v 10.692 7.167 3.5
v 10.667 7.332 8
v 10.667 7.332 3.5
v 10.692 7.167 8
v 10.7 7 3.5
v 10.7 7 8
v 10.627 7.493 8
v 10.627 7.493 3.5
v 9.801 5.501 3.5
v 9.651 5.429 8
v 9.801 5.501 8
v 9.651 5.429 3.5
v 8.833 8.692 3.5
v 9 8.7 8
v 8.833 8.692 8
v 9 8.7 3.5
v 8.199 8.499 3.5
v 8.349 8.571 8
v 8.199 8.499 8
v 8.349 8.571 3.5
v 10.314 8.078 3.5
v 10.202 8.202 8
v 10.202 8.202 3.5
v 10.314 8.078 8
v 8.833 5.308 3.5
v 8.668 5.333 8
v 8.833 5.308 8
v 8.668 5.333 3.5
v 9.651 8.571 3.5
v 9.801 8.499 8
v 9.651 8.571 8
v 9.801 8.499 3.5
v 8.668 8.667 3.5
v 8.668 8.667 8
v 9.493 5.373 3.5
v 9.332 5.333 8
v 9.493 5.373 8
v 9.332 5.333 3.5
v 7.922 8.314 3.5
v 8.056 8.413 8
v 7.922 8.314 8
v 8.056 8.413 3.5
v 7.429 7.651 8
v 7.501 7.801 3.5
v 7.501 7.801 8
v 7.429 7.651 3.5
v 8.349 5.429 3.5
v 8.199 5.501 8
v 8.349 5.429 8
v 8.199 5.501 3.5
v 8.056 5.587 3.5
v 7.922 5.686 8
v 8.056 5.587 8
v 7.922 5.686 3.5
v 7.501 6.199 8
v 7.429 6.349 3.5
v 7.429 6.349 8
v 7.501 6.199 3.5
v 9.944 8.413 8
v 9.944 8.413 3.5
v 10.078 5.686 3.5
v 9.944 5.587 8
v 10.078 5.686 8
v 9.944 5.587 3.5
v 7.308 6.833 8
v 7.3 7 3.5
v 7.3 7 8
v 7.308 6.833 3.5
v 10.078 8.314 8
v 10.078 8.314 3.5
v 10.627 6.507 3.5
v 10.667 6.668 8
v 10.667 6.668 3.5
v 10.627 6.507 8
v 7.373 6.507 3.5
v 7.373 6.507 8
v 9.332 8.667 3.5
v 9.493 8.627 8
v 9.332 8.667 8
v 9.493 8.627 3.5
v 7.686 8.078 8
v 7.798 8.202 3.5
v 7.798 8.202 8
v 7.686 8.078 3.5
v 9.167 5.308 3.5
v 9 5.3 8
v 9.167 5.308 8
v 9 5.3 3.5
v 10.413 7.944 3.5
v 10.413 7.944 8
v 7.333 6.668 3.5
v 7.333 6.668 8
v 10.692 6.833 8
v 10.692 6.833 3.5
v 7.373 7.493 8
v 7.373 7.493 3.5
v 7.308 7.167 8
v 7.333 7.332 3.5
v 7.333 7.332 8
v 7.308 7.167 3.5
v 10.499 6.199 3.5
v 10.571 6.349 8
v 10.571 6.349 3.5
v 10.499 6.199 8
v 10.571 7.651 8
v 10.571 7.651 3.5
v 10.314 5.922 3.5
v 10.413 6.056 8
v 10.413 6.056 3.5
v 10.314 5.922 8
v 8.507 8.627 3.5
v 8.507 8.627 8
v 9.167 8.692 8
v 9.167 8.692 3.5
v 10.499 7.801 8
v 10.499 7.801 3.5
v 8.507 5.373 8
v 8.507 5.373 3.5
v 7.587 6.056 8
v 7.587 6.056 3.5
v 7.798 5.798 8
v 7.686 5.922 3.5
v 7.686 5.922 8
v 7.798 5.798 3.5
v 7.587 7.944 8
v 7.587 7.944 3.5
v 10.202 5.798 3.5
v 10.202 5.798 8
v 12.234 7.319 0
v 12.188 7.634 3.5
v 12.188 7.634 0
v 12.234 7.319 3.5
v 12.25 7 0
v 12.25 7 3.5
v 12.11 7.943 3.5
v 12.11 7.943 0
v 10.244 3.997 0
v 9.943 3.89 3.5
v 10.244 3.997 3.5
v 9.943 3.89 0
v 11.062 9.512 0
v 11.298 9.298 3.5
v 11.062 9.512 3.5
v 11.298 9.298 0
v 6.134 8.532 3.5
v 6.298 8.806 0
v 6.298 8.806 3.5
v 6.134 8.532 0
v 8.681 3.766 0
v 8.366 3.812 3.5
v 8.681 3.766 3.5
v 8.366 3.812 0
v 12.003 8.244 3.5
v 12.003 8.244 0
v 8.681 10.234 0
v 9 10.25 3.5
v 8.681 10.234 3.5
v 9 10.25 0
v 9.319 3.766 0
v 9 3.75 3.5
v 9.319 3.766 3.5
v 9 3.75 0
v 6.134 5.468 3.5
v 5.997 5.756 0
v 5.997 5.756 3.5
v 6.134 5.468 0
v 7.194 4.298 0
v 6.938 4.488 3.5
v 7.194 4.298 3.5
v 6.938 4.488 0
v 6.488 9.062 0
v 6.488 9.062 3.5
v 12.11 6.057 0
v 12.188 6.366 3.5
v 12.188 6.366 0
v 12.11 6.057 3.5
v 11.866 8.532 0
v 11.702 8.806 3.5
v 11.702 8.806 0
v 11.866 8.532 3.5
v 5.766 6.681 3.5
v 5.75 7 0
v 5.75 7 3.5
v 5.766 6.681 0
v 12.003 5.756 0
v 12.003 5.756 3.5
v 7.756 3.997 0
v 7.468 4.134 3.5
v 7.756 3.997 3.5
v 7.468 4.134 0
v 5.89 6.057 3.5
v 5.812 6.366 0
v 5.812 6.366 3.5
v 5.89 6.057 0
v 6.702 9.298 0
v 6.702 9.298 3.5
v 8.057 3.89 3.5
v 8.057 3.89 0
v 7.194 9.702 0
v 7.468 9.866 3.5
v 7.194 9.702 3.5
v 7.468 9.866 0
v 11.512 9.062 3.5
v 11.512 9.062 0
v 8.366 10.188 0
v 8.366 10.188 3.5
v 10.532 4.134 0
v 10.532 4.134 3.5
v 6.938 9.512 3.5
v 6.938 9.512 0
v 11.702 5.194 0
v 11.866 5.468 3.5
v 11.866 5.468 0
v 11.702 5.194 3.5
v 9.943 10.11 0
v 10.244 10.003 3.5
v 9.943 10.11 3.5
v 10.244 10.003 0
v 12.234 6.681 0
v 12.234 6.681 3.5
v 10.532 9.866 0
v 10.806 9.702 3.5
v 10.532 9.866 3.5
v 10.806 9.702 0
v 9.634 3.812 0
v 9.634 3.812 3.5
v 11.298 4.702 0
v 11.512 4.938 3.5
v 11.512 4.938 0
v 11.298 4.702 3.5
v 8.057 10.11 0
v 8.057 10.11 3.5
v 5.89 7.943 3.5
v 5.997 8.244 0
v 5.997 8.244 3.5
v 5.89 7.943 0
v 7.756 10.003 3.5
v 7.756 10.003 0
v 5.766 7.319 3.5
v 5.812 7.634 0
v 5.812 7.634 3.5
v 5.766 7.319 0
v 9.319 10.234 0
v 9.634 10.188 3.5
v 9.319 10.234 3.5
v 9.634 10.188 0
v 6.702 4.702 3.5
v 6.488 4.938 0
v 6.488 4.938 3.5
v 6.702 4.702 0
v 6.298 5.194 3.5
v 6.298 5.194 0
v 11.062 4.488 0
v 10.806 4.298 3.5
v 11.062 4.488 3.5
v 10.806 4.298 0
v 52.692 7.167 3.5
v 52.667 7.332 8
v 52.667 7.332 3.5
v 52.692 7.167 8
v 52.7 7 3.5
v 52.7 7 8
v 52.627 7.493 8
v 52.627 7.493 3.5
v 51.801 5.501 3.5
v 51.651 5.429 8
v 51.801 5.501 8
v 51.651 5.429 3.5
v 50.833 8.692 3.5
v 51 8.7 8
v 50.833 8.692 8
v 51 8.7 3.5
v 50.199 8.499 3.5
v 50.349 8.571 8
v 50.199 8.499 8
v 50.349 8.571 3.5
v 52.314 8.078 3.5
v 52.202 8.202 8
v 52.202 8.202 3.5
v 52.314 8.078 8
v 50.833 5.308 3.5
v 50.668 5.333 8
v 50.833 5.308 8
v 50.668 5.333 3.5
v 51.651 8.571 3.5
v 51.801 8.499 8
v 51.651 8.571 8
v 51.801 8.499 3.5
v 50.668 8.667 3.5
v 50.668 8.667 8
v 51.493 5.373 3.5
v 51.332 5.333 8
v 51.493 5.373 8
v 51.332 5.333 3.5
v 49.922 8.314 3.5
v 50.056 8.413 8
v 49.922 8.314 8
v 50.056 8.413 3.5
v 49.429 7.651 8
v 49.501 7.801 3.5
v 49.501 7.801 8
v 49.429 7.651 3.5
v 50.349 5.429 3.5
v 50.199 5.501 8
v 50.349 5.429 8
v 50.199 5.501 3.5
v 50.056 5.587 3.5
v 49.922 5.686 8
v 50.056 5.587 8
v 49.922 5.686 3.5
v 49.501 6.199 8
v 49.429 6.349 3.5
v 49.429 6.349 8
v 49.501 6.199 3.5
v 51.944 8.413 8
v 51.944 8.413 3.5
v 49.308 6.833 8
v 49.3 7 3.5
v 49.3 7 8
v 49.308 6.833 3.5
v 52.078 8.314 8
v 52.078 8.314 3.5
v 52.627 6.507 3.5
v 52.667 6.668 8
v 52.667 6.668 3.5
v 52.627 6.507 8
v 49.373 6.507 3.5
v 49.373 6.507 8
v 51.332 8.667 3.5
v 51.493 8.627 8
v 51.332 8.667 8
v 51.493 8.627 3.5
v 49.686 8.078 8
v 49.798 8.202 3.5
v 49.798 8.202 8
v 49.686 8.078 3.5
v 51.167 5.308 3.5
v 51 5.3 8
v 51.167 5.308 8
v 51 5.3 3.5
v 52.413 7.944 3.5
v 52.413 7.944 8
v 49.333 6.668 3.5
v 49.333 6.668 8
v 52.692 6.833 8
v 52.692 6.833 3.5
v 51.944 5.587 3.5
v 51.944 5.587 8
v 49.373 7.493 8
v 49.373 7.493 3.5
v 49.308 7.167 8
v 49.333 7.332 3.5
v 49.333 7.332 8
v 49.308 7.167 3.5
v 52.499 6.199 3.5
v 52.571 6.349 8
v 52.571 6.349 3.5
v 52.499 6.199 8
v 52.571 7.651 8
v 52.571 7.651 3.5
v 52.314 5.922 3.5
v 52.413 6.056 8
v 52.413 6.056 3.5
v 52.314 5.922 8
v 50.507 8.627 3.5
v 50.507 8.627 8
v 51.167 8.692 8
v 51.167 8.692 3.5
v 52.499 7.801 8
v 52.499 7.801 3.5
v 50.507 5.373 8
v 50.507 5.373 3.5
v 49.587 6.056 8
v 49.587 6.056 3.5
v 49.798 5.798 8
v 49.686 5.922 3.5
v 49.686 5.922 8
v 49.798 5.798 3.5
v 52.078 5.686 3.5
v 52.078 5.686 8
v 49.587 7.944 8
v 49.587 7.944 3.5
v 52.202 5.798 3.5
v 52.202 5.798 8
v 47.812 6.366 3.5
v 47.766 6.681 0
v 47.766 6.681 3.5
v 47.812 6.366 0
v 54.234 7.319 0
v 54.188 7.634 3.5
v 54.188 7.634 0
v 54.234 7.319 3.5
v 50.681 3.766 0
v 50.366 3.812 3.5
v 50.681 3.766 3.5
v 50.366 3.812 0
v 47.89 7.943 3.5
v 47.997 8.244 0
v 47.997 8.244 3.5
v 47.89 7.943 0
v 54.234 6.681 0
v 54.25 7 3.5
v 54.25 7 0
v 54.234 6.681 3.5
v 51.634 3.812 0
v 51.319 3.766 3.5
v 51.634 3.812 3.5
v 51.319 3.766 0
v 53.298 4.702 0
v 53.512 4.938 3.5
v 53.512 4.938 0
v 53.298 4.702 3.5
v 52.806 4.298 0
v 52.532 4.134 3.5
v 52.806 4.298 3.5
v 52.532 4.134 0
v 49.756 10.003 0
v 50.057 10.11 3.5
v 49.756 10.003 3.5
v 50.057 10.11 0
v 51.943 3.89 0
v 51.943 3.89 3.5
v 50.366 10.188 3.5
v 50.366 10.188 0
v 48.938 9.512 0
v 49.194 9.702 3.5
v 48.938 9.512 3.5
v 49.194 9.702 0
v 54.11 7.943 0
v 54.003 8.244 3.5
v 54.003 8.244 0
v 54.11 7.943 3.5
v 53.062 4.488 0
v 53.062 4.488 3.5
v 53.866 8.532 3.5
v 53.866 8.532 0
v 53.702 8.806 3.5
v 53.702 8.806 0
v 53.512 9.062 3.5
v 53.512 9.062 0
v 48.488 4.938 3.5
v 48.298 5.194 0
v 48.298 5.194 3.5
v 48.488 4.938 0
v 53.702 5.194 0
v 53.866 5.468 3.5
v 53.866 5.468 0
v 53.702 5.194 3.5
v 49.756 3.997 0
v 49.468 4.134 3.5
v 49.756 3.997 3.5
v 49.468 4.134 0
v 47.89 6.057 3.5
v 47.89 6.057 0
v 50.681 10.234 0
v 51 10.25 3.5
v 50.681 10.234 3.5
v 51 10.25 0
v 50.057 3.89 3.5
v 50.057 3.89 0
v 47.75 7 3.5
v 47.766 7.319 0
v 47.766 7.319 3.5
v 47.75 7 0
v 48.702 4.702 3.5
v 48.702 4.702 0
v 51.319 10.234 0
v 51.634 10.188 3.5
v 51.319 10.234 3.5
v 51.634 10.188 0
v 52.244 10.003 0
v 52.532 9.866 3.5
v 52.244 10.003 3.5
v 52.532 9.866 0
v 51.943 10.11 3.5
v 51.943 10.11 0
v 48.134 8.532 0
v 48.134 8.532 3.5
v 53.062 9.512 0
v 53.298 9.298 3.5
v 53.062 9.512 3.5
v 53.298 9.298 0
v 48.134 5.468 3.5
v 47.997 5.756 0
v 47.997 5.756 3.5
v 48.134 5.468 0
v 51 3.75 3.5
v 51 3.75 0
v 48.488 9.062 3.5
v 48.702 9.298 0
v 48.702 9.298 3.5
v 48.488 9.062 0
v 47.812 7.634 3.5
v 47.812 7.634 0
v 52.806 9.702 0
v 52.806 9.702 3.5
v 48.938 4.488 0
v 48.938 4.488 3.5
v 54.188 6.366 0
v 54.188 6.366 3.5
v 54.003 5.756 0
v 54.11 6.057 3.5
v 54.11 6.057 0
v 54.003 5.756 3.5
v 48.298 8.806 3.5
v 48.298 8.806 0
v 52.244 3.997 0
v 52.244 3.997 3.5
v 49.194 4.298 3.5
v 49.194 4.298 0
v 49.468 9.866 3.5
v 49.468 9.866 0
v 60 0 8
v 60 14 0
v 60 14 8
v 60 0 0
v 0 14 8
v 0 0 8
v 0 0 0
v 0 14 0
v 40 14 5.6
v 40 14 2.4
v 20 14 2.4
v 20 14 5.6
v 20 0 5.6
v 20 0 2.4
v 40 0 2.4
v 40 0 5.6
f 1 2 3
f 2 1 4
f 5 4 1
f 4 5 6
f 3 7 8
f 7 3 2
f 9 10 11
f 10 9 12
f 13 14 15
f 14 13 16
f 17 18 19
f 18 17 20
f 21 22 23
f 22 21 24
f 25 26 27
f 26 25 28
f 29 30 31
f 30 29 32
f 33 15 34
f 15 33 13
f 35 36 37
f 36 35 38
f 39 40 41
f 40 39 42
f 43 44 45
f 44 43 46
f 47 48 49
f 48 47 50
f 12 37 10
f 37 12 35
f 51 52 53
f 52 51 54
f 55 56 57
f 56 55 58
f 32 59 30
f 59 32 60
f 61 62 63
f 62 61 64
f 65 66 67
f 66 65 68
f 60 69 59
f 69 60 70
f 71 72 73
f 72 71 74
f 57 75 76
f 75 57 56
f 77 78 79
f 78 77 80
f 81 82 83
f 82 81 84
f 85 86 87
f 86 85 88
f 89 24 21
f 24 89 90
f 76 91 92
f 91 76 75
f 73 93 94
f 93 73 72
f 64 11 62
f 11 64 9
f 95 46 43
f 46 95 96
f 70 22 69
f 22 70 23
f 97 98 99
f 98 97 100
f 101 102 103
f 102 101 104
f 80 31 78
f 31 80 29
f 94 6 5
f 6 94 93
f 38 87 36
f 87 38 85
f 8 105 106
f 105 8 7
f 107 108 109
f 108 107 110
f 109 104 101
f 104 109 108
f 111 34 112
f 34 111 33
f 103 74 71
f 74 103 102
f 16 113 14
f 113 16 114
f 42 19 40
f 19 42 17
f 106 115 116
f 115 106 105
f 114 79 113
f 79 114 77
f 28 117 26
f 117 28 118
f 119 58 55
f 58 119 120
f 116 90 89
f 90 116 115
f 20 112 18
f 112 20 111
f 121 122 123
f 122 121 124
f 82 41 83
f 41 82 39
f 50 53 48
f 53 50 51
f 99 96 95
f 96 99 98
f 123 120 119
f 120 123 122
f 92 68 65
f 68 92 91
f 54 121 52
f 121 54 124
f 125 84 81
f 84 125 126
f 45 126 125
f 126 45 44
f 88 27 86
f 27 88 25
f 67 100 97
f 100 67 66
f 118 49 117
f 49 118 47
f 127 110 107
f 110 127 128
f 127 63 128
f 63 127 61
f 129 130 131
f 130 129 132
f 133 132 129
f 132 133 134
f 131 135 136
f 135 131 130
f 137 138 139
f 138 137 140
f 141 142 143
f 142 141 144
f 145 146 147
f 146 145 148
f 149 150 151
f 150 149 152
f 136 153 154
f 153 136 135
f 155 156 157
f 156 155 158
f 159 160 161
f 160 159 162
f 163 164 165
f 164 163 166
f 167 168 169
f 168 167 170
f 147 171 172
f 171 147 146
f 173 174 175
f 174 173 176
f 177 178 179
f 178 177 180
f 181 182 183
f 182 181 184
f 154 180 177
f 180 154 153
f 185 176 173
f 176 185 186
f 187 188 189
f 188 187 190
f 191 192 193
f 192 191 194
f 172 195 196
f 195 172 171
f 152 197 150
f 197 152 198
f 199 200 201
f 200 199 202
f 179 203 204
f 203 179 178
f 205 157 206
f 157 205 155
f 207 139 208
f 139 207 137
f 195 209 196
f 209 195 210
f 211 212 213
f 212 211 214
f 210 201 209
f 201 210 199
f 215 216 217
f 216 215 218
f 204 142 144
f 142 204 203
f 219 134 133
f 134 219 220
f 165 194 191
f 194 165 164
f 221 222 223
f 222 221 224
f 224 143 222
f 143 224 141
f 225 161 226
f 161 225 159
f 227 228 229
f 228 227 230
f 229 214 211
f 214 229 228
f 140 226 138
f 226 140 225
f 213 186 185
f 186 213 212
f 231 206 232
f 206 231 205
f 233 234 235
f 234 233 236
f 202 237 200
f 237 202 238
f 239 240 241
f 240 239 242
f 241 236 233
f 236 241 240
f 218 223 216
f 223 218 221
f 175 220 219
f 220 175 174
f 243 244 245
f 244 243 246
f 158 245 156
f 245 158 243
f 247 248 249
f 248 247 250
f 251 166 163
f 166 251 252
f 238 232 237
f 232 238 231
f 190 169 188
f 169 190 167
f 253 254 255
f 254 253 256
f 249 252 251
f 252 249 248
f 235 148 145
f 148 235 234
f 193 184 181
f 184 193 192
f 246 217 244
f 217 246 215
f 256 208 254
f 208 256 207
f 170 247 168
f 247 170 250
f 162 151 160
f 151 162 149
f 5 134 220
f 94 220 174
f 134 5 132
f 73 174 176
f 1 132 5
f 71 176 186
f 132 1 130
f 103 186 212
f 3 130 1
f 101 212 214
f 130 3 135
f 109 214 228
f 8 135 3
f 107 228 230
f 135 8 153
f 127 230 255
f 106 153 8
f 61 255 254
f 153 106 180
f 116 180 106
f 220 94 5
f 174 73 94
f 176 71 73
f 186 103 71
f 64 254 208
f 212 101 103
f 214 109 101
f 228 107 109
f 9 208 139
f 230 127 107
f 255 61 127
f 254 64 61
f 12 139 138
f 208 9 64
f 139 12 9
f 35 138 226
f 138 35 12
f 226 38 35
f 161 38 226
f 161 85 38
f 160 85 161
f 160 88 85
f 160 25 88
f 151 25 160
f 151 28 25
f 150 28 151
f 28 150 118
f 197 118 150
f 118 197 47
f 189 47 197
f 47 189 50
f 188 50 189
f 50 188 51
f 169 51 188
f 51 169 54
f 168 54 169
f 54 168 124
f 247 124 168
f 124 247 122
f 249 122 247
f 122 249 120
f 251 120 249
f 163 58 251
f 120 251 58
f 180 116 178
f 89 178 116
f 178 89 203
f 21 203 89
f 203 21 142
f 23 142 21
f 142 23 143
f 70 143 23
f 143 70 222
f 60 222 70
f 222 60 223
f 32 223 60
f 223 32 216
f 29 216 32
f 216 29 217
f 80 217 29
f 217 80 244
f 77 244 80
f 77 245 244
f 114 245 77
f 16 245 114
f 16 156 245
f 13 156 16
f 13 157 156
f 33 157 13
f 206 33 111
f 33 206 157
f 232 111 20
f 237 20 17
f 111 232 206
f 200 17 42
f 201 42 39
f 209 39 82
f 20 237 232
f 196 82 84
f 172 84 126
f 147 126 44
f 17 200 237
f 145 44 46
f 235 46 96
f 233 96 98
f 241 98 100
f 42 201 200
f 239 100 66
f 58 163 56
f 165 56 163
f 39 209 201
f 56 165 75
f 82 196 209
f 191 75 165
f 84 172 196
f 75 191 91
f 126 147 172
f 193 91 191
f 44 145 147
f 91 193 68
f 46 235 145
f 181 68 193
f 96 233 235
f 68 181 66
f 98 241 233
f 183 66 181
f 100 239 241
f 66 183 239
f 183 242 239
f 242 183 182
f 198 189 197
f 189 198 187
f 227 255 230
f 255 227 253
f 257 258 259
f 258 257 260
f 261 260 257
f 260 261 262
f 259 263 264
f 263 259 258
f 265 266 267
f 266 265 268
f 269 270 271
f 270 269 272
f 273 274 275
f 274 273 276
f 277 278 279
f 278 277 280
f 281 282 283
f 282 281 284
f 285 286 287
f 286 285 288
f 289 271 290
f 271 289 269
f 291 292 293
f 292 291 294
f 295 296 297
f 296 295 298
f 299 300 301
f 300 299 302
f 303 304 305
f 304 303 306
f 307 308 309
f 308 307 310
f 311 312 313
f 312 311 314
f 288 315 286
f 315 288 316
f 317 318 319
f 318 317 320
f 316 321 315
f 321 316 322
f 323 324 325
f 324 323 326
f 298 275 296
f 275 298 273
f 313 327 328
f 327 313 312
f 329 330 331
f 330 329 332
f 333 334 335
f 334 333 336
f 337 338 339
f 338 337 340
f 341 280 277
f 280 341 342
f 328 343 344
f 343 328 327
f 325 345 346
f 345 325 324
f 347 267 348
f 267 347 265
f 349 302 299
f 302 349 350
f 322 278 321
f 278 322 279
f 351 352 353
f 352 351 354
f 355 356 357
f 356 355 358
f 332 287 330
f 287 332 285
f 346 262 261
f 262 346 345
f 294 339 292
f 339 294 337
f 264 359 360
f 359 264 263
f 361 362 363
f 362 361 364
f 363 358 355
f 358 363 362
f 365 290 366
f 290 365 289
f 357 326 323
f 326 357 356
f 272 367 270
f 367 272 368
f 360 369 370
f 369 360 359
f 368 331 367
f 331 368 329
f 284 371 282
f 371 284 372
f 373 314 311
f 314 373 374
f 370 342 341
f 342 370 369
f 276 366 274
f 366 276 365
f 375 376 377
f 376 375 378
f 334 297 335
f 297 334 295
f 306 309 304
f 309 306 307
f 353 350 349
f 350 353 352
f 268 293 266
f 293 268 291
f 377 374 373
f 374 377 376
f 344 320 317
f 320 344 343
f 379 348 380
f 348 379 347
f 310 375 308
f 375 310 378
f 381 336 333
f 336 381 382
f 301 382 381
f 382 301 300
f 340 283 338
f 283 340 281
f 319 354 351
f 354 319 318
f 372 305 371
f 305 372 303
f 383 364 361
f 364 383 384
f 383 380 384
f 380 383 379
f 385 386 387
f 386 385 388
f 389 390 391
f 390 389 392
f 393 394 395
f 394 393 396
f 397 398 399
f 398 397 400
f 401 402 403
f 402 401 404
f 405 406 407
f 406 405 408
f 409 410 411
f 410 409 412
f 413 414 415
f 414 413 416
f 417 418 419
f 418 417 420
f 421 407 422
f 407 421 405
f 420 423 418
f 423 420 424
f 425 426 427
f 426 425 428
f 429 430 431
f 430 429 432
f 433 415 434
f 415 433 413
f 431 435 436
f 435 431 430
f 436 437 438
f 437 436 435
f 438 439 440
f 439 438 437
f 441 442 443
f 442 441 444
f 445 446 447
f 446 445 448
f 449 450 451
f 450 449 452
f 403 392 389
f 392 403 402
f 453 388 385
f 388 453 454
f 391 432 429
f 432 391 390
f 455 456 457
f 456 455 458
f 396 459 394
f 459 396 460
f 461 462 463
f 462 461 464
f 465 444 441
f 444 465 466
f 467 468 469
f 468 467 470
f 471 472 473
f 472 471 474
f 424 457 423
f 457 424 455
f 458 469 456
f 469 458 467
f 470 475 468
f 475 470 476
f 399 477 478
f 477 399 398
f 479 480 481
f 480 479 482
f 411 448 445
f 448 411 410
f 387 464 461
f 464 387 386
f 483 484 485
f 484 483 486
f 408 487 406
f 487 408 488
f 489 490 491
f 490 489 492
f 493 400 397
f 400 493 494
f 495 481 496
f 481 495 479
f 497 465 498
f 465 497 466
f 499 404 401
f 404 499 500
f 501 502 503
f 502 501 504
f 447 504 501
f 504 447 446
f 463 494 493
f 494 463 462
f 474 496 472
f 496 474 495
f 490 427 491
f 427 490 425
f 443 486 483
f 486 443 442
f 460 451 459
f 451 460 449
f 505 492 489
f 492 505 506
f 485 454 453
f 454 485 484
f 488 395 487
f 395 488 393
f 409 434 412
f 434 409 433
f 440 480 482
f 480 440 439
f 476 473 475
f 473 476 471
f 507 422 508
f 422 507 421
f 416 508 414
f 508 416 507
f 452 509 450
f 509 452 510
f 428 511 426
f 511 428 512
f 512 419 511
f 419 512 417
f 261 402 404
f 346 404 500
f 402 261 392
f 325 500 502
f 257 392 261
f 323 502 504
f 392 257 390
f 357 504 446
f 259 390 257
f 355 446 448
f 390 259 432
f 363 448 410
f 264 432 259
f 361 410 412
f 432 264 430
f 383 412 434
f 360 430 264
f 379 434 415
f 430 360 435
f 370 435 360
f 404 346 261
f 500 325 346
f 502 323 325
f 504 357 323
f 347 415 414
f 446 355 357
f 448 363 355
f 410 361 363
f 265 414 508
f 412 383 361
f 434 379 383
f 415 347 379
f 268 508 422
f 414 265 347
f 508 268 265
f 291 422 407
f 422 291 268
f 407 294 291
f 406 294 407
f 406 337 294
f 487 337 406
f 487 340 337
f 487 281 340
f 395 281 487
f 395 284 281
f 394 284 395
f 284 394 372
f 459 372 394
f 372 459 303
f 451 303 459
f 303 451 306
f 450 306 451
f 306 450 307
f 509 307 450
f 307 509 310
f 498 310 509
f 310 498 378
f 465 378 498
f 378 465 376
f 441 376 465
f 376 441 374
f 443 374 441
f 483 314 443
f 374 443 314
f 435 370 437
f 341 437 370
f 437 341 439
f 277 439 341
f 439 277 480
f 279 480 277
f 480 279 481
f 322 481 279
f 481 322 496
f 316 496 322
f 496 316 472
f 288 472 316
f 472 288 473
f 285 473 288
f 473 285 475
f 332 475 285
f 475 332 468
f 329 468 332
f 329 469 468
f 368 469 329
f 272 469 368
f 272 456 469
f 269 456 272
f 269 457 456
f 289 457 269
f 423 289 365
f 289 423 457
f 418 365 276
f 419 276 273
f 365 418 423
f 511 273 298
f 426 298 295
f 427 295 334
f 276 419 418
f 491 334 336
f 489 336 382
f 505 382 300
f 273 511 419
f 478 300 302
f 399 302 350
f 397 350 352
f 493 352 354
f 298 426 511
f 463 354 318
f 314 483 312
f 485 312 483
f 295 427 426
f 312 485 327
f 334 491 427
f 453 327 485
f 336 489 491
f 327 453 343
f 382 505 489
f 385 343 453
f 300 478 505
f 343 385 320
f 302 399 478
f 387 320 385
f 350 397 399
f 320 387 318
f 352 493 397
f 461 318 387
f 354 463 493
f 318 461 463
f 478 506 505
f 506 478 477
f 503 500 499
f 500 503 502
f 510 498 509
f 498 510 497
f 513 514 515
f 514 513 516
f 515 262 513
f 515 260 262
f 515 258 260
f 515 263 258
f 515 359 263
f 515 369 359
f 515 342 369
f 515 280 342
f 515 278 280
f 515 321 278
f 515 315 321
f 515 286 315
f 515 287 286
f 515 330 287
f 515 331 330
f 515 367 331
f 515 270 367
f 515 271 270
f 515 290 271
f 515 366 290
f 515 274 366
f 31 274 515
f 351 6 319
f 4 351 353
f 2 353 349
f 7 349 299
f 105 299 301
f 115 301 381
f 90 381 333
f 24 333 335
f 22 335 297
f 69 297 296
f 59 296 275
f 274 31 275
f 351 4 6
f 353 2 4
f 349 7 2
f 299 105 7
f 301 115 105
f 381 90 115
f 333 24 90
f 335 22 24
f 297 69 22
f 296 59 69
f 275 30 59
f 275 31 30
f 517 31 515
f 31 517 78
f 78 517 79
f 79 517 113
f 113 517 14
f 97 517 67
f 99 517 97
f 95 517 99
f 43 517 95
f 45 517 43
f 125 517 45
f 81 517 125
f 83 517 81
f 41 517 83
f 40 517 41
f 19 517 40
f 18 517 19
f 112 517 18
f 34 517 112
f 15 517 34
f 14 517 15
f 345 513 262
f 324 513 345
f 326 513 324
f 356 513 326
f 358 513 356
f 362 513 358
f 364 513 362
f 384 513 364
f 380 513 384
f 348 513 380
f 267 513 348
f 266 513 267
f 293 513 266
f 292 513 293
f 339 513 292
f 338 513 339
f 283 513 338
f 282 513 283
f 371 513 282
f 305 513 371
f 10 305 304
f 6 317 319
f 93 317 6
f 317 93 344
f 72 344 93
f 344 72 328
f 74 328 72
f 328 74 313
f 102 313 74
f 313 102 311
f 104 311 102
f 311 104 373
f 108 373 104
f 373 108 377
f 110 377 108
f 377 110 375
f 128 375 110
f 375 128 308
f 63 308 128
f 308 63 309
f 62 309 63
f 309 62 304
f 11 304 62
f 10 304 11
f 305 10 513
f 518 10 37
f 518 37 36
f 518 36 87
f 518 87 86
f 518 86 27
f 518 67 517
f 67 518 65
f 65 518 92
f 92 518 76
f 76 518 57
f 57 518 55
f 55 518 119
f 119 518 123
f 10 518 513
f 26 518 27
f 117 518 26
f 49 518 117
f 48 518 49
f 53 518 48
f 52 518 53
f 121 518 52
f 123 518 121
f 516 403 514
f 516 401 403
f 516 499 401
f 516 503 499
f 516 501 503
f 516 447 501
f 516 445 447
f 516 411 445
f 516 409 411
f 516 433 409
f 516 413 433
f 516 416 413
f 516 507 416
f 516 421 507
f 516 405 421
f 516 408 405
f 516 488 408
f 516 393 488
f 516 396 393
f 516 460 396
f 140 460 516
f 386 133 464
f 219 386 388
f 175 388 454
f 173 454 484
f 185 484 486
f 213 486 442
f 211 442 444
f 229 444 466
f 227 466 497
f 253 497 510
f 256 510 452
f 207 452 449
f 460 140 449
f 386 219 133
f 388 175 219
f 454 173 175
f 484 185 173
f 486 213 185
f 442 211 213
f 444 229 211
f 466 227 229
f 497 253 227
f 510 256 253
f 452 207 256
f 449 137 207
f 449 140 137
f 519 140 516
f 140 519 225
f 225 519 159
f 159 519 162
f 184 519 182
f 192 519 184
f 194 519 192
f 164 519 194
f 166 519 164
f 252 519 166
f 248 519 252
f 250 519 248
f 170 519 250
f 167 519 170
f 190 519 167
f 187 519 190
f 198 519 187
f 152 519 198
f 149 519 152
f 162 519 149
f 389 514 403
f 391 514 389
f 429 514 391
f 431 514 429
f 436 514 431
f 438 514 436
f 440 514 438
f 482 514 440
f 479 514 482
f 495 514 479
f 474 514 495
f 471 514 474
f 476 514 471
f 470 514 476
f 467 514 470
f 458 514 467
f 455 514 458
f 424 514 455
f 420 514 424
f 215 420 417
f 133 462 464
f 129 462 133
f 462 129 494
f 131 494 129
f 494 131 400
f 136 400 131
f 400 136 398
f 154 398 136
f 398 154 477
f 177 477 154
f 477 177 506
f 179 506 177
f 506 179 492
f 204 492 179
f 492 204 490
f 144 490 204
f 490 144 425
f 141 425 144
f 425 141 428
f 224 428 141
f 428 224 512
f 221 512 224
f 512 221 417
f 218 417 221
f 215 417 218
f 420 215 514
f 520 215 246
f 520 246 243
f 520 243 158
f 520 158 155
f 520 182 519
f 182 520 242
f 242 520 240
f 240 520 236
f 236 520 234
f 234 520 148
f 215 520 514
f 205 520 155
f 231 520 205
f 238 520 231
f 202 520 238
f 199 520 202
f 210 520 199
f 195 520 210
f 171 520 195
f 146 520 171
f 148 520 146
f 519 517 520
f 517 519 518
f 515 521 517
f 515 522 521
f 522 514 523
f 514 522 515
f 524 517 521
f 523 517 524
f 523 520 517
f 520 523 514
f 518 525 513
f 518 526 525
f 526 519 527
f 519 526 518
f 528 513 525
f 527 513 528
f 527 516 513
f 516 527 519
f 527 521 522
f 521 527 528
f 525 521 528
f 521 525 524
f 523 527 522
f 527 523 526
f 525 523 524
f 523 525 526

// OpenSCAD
// file: config.scad
// ─────────────────────────────────────────────────────────────────────────────
//  config.scad  –  Global parameters for modular open-frame desktop
//                  mini-server rack
//
//  Rack outer envelope : 250 × 260 × 285 mm  (W × D × H)
//  Fastener standard   : M3 heat-set inserts + M3 cap-head screws
//  Print target        : Bambu H2D (350 × 320 mm bed)
// ─────────────────────────────────────────────────────────────────────────────

// ── Rack outer envelope ───────────────────────────────────────────────────────
RACK_W = 250;    // overall width   (X) mm
RACK_D = 260;    // overall depth   (Y) mm
RACK_H = 285;    // overall height  (Z) mm

// ── Side rail cross-section ───────────────────────────────────────────────────
RAIL_W = 20;     // rail thickness  (X) mm
RAIL_D = RACK_D; // rail runs full depth
RAIL_H = RACK_H; // rail runs full height

// Usable inner width between the two rails
INNER_W = RACK_W - 2 * RAIL_W;   // 210 mm

// Pitch (mm) between mounting-insert rows along rail height
SLOT_PITCH = 20;

// ── Crossbar ─────────────────────────────────────────────────────────────────
CBAR_W = RACK_W;  // full rack width  (X)
CBAR_D = 25;      // front-to-back depth (Y)
CBAR_H = 8;       // thickness (Z)

// Y offsets of the two mounting screws per crossbar end
// (measured from the crossbar's own front face)
CBAR_MOUNT_Y1 = CBAR_D * 0.30;   // ≈ 7.5 mm
CBAR_MOUNT_Y2 = CBAR_D * 0.70;   // ≈ 17.5 mm

// ── Device dimensions  W × D × H  (all in mm) ────────────────────────────────
MM2_W = 196.85;  MM2_D = 196.85;  MM2_H = 35.8;   // Mac mini M2
MM4_W = 127.0;   MM4_D = 127.0;   MM4_H = 50.0;   // Mac mini M4
PI5_W = 85.0;    PI5_D = 56.0;    PI5_H = 17.0;   // Raspberry Pi 5 PCB
ATV_W = 93.0;    ATV_D = 93.0;    ATV_H = 31.0;   // Apple TV 4K 3rd gen
FX_W  = 167.0;   FX_D  = 104.0;   FX_H  = 52.0;   // Inseego FX4100

// ── Raspberry Pi 5 mounting-hole grid (from board origin corner) ──────────────
PI5_HOLE_X1 = 3.5;
PI5_HOLE_X2 = 61.5;
PI5_HOLE_Y1 = 3.5;
PI5_HOLE_Y2 = 52.5;
PI5_STANDOFF_H  = 5.0;   // height of standoff posts above plate floor
PI5_STANDOFF_OD = 6.0;   // standoff outer diameter
PI5_HOLE_D      = 2.7;   // M2.5 clearance hole through standoff

// ── Fasteners – M3 heat-set inserts + M3 screws ───────────────────────────────
M3_INSERT_D = 4.7;   // insert outer Ø  (press-fit into 4.5 mm hole → +0.2 entry)
M3_INSERT_H = 5.7;   // insert depth
M3_CLEAR_D  = 3.4;   // M3 clearance hole Ø
M3_HEAD_D   = 6.0;   // M3 cap-head Ø
M3_HEAD_H   = 3.0;   // M3 cap-head height
M3_CBORE_D  = 6.5;   // counterbore Ø (seat for cap head)

// ── Print / geometry ──────────────────────────────────────────────────────────
WALL      = 3.0;   // shell wall thickness
FLOOR     = 2.5;   // tray / plate floor thickness
LIP_H     = 6.0;   // front retention-lip height above device top
CLEARANCE = 0.2;   // per-side fit clearance (0.4 mm total)

// ── Vent slots ────────────────────────────────────────────────────────────────
VENT_W     = 3.0;    // slot width
VENT_L     = 20.0;   // slot length (along its own long axis)
VENT_PITCH = 6.0;    // centre-to-centre pitch between slots

// ── Cable-relief slots in rear tray wall ─────────────────────────────────────
CABLE_SLOT_W = 8.0;
CABLE_SLOT_H = 20.0;  // height of opening in rear wall

// ── Anti-vibration feet ───────────────────────────────────────────────────────
FOOT_OD       = 25;   // outer Ø
FOOT_H        = 10;   // total height
FOOT_RUBBER_D = 20;   // rubber-pad recess Ø
FOOT_RUBBER_H = 3;    // rubber-pad recess depth

// ── Strap slot for FX4100 cradle ─────────────────────────────────────────────
STRAP_W = 20;    // strap width
STRAP_H =  3;    // strap slot thickness (clearance)

// ── Render quality ────────────────────────────────────────────────────────────
$fn = 64;
// main file
// ─────────────────────────────────────────────────────────────────────────────
//  clamp_bar.scad  –  Clamp bar for hook-and-loop strap retention
//
//  Used as the opposing half of the strap system on the FX4100 cradle (and
//  any other cradle that needs lateral strap retention).
//
//  The bar slots through the strap-routing openings in the cradle side wall.
//  A M3 cap-head screw at each end threads into the side-wall insert or a
//  captured nut to lock the strap tension.
//
//  Geometry
//    • Flat rectangular bar : _bar_l × _bar_d × _bar_h
//    • Strap routing slot   : centred, STRAP_W wide, STRAP_H + CLEARANCE tall
//    • M3 counterbored holes at each end for cap-head screws
// ─────────────────────────────────────────────────────────────────────────────
include <config.scad>

// ── Clamp-bar dimensions ──────────────────────────────────────────────────────
_bar_l = 60;     // bar length  (X) – spans across device + both side walls
_bar_d = 14;     // bar depth   (Y) – slightly wider than strap
_bar_h =  8;     // bar height  (Z)

// Counterbore depth for M3 cap head
_cbore_depth = M3_HEAD_H + 0.5;

module clamp_bar() {
    difference() {
        // ── Bar body ──────────────────────────────────────────────────────────
        cube([_bar_l, _bar_d, _bar_h]);

        // ── Strap routing slot (centred, runs full bar depth) ─────────────────
        translate([(_bar_l - STRAP_W) / 2, -0.1, (_bar_h - STRAP_H - CLEARANCE) / 2])
            cube([STRAP_W, _bar_d + 0.2, STRAP_H + CLEARANCE]);

        // ── M3 counterbored screw hole – left end ─────────────────────────────
        translate([_bar_l * 0.15, _bar_d / 2, -0.1]) {
            cylinder(d = M3_CLEAR_D, h = _bar_h + 0.2);                  // shank
            cylinder(d = M3_CBORE_D, h = _cbore_depth + 0.1);            // head seat
        }

        // ── M3 counterbored screw hole – right end ────────────────────────────
        translate([_bar_l * 0.85, _bar_d / 2, -0.1]) {
            cylinder(d = M3_CLEAR_D, h = _bar_h + 0.2);
            cylinder(d = M3_CBORE_D, h = _cbore_depth + 0.1);
        }
    }
}

clamp_bar();
